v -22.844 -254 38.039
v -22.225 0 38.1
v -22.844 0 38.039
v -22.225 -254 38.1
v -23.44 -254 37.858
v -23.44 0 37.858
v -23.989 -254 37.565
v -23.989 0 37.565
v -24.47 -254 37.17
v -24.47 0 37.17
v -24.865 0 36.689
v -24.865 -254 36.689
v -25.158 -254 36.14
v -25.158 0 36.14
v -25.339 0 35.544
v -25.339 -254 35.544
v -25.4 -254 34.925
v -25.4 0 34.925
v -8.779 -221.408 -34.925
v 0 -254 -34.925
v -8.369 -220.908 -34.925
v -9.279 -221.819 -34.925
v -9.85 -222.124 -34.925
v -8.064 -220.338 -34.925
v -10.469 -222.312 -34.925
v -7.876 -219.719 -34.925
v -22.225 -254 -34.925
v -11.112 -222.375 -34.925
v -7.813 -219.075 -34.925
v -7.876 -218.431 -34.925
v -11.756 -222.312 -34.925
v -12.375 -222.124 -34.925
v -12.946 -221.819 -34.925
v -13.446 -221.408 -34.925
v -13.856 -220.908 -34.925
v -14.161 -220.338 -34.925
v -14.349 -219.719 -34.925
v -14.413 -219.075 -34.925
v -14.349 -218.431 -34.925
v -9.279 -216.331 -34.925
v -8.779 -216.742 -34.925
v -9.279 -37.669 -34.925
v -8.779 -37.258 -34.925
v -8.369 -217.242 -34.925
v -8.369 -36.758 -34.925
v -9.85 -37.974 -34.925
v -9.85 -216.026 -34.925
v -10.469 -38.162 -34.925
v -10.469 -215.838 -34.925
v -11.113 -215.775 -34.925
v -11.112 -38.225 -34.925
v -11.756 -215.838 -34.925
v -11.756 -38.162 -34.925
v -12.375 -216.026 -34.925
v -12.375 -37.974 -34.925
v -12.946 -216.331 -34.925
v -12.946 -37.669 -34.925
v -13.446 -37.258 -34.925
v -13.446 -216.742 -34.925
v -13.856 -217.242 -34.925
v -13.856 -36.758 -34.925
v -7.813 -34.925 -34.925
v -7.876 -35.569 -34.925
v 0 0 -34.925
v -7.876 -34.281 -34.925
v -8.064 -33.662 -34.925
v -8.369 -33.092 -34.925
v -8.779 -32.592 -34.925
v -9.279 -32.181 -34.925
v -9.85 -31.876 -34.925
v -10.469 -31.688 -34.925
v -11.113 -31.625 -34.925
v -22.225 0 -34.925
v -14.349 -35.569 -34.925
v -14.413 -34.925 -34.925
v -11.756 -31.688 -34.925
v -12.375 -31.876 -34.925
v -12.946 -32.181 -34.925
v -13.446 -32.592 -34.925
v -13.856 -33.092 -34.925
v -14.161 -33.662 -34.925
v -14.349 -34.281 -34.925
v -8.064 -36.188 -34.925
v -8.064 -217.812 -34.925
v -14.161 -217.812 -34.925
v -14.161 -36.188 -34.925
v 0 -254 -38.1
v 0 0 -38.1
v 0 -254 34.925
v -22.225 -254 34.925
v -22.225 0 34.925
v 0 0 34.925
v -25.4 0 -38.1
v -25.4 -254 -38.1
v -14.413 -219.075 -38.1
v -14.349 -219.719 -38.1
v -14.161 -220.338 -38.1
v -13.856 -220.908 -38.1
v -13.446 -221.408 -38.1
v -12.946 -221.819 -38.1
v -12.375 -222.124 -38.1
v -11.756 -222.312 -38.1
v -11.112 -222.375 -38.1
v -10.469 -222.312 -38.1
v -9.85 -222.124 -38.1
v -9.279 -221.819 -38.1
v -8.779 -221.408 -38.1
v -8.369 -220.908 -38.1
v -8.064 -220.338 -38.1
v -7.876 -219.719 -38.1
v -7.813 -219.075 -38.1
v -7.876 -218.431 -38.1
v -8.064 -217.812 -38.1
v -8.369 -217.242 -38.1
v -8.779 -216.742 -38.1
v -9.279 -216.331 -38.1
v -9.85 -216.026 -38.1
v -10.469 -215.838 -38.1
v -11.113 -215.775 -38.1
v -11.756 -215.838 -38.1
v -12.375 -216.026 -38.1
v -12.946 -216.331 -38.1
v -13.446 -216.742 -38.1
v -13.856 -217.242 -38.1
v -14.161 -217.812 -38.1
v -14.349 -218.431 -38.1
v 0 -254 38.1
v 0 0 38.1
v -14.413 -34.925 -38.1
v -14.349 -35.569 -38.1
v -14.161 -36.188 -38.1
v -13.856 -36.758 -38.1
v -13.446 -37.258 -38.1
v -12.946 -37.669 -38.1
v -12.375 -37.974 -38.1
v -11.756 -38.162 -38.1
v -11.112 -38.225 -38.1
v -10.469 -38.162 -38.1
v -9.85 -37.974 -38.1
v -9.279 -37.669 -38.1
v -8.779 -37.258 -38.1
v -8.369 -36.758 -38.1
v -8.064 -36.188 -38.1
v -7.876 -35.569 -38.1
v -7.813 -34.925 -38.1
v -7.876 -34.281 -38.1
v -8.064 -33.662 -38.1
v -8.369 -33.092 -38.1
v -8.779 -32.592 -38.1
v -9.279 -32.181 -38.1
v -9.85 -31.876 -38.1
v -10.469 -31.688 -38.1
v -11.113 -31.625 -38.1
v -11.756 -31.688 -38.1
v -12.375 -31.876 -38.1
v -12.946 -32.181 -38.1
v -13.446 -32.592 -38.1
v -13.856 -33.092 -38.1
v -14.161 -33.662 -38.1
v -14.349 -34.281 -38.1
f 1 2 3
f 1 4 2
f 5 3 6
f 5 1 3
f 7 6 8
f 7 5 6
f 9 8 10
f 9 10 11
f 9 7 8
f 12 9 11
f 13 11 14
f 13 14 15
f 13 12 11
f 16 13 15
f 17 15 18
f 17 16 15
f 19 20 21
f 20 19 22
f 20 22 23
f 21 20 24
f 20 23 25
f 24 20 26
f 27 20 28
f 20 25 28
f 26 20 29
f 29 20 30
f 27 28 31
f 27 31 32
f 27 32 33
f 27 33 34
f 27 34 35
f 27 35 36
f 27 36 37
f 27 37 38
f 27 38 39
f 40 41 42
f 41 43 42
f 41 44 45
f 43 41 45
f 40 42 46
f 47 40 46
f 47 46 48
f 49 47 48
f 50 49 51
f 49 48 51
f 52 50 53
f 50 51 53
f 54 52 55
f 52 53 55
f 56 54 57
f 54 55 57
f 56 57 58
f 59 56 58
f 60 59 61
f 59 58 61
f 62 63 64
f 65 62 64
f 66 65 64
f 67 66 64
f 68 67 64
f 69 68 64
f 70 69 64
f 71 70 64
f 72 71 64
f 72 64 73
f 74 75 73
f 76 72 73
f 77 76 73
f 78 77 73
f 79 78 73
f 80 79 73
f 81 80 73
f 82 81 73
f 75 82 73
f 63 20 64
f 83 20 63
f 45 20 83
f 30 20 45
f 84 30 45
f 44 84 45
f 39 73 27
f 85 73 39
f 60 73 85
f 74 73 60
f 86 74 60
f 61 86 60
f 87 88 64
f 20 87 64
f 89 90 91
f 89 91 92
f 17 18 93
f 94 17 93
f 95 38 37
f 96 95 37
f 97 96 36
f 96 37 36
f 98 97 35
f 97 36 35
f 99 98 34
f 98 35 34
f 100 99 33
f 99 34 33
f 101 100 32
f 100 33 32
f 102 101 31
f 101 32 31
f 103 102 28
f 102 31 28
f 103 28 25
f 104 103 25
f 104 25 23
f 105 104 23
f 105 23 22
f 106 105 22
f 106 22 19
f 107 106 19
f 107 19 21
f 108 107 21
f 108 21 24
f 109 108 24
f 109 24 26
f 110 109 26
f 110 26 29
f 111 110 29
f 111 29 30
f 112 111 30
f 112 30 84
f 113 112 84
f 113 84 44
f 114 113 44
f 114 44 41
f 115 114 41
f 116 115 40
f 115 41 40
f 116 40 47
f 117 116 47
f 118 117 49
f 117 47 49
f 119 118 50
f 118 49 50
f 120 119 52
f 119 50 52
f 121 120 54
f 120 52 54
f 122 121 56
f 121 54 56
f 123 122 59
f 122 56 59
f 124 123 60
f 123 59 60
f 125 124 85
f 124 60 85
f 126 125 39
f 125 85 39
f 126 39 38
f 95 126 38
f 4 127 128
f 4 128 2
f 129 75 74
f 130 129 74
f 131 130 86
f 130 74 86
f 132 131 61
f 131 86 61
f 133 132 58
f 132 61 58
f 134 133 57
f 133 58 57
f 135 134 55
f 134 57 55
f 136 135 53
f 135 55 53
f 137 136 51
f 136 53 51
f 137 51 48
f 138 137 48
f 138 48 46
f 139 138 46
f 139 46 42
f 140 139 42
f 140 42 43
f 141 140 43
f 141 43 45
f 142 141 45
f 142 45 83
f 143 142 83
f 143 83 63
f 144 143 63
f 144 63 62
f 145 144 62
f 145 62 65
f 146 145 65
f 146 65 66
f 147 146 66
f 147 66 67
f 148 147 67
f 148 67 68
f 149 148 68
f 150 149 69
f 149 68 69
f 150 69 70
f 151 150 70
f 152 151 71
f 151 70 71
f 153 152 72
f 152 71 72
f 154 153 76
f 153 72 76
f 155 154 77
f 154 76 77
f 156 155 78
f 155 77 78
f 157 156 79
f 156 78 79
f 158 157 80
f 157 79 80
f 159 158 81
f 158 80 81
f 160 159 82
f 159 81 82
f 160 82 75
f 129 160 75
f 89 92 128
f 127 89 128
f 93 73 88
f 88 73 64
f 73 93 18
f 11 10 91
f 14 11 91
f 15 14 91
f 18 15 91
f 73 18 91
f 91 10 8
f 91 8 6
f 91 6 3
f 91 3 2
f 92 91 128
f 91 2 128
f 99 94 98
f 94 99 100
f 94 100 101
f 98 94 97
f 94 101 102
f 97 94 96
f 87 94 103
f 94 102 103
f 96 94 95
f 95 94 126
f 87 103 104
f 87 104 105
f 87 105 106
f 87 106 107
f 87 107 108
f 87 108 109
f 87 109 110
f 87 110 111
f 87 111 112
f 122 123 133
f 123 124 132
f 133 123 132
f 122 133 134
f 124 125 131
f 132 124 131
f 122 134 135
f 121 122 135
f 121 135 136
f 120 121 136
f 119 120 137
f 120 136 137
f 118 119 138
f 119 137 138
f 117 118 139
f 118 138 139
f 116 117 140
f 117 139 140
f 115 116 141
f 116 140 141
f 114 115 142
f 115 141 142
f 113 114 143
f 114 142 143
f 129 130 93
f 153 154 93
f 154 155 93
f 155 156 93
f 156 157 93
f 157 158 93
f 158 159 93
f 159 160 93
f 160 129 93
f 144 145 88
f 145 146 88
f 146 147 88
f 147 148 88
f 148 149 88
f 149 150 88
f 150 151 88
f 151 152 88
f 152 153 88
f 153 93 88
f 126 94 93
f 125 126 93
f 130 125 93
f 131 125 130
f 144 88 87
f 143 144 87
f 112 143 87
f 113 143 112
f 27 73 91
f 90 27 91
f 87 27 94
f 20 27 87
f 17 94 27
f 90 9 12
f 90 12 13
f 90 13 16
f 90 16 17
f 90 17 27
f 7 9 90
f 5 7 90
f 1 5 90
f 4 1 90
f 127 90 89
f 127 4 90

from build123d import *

# Parameters (mm, degrees)
F1_DEPTH = 254
F3_D     = 6.6
F3_DEPTH = 15
F3_TIP   = 1.9828400428
F4_R     = 3.175


with BuildPart() as f1:
    # F0 (on Front) → F1 (new body)
    with BuildSketch(Plane.XZ):
        Polygon((0, 34.925), (0, 38.1), (-25.4, 38.1), (-25.4, -38.1), (0, -38.1), (0, -34.925), (-22.225, -34.925), (-22.225, 34.925), align=None)
    extrude(amount=F1_DEPTH)

    # F3
    with Locations(Plane(origin=(0, 0, -38.1), x_dir=(1, 0, 0), z_dir=(0, 0, -1))):
        with Locations((-11.1125, 219.075), (-11.1125, 34.925)):
            Hole(F3_D / 2, depth=F3_DEPTH)
            with Locations((0, 0, -(F3_DEPTH + F3_TIP / 2))):  # 118° drill point
                Cone(0, F3_D / 2, F3_TIP, mode=Mode.SUBTRACT)

    # F4
    f4_edges = [f1.edges().sort_by_distance(p)[0] for p in [
        (-25.4, -127, 38.1),
    ]]
    fillet(f4_edges, radius=F4_R)


solid = f1.part
